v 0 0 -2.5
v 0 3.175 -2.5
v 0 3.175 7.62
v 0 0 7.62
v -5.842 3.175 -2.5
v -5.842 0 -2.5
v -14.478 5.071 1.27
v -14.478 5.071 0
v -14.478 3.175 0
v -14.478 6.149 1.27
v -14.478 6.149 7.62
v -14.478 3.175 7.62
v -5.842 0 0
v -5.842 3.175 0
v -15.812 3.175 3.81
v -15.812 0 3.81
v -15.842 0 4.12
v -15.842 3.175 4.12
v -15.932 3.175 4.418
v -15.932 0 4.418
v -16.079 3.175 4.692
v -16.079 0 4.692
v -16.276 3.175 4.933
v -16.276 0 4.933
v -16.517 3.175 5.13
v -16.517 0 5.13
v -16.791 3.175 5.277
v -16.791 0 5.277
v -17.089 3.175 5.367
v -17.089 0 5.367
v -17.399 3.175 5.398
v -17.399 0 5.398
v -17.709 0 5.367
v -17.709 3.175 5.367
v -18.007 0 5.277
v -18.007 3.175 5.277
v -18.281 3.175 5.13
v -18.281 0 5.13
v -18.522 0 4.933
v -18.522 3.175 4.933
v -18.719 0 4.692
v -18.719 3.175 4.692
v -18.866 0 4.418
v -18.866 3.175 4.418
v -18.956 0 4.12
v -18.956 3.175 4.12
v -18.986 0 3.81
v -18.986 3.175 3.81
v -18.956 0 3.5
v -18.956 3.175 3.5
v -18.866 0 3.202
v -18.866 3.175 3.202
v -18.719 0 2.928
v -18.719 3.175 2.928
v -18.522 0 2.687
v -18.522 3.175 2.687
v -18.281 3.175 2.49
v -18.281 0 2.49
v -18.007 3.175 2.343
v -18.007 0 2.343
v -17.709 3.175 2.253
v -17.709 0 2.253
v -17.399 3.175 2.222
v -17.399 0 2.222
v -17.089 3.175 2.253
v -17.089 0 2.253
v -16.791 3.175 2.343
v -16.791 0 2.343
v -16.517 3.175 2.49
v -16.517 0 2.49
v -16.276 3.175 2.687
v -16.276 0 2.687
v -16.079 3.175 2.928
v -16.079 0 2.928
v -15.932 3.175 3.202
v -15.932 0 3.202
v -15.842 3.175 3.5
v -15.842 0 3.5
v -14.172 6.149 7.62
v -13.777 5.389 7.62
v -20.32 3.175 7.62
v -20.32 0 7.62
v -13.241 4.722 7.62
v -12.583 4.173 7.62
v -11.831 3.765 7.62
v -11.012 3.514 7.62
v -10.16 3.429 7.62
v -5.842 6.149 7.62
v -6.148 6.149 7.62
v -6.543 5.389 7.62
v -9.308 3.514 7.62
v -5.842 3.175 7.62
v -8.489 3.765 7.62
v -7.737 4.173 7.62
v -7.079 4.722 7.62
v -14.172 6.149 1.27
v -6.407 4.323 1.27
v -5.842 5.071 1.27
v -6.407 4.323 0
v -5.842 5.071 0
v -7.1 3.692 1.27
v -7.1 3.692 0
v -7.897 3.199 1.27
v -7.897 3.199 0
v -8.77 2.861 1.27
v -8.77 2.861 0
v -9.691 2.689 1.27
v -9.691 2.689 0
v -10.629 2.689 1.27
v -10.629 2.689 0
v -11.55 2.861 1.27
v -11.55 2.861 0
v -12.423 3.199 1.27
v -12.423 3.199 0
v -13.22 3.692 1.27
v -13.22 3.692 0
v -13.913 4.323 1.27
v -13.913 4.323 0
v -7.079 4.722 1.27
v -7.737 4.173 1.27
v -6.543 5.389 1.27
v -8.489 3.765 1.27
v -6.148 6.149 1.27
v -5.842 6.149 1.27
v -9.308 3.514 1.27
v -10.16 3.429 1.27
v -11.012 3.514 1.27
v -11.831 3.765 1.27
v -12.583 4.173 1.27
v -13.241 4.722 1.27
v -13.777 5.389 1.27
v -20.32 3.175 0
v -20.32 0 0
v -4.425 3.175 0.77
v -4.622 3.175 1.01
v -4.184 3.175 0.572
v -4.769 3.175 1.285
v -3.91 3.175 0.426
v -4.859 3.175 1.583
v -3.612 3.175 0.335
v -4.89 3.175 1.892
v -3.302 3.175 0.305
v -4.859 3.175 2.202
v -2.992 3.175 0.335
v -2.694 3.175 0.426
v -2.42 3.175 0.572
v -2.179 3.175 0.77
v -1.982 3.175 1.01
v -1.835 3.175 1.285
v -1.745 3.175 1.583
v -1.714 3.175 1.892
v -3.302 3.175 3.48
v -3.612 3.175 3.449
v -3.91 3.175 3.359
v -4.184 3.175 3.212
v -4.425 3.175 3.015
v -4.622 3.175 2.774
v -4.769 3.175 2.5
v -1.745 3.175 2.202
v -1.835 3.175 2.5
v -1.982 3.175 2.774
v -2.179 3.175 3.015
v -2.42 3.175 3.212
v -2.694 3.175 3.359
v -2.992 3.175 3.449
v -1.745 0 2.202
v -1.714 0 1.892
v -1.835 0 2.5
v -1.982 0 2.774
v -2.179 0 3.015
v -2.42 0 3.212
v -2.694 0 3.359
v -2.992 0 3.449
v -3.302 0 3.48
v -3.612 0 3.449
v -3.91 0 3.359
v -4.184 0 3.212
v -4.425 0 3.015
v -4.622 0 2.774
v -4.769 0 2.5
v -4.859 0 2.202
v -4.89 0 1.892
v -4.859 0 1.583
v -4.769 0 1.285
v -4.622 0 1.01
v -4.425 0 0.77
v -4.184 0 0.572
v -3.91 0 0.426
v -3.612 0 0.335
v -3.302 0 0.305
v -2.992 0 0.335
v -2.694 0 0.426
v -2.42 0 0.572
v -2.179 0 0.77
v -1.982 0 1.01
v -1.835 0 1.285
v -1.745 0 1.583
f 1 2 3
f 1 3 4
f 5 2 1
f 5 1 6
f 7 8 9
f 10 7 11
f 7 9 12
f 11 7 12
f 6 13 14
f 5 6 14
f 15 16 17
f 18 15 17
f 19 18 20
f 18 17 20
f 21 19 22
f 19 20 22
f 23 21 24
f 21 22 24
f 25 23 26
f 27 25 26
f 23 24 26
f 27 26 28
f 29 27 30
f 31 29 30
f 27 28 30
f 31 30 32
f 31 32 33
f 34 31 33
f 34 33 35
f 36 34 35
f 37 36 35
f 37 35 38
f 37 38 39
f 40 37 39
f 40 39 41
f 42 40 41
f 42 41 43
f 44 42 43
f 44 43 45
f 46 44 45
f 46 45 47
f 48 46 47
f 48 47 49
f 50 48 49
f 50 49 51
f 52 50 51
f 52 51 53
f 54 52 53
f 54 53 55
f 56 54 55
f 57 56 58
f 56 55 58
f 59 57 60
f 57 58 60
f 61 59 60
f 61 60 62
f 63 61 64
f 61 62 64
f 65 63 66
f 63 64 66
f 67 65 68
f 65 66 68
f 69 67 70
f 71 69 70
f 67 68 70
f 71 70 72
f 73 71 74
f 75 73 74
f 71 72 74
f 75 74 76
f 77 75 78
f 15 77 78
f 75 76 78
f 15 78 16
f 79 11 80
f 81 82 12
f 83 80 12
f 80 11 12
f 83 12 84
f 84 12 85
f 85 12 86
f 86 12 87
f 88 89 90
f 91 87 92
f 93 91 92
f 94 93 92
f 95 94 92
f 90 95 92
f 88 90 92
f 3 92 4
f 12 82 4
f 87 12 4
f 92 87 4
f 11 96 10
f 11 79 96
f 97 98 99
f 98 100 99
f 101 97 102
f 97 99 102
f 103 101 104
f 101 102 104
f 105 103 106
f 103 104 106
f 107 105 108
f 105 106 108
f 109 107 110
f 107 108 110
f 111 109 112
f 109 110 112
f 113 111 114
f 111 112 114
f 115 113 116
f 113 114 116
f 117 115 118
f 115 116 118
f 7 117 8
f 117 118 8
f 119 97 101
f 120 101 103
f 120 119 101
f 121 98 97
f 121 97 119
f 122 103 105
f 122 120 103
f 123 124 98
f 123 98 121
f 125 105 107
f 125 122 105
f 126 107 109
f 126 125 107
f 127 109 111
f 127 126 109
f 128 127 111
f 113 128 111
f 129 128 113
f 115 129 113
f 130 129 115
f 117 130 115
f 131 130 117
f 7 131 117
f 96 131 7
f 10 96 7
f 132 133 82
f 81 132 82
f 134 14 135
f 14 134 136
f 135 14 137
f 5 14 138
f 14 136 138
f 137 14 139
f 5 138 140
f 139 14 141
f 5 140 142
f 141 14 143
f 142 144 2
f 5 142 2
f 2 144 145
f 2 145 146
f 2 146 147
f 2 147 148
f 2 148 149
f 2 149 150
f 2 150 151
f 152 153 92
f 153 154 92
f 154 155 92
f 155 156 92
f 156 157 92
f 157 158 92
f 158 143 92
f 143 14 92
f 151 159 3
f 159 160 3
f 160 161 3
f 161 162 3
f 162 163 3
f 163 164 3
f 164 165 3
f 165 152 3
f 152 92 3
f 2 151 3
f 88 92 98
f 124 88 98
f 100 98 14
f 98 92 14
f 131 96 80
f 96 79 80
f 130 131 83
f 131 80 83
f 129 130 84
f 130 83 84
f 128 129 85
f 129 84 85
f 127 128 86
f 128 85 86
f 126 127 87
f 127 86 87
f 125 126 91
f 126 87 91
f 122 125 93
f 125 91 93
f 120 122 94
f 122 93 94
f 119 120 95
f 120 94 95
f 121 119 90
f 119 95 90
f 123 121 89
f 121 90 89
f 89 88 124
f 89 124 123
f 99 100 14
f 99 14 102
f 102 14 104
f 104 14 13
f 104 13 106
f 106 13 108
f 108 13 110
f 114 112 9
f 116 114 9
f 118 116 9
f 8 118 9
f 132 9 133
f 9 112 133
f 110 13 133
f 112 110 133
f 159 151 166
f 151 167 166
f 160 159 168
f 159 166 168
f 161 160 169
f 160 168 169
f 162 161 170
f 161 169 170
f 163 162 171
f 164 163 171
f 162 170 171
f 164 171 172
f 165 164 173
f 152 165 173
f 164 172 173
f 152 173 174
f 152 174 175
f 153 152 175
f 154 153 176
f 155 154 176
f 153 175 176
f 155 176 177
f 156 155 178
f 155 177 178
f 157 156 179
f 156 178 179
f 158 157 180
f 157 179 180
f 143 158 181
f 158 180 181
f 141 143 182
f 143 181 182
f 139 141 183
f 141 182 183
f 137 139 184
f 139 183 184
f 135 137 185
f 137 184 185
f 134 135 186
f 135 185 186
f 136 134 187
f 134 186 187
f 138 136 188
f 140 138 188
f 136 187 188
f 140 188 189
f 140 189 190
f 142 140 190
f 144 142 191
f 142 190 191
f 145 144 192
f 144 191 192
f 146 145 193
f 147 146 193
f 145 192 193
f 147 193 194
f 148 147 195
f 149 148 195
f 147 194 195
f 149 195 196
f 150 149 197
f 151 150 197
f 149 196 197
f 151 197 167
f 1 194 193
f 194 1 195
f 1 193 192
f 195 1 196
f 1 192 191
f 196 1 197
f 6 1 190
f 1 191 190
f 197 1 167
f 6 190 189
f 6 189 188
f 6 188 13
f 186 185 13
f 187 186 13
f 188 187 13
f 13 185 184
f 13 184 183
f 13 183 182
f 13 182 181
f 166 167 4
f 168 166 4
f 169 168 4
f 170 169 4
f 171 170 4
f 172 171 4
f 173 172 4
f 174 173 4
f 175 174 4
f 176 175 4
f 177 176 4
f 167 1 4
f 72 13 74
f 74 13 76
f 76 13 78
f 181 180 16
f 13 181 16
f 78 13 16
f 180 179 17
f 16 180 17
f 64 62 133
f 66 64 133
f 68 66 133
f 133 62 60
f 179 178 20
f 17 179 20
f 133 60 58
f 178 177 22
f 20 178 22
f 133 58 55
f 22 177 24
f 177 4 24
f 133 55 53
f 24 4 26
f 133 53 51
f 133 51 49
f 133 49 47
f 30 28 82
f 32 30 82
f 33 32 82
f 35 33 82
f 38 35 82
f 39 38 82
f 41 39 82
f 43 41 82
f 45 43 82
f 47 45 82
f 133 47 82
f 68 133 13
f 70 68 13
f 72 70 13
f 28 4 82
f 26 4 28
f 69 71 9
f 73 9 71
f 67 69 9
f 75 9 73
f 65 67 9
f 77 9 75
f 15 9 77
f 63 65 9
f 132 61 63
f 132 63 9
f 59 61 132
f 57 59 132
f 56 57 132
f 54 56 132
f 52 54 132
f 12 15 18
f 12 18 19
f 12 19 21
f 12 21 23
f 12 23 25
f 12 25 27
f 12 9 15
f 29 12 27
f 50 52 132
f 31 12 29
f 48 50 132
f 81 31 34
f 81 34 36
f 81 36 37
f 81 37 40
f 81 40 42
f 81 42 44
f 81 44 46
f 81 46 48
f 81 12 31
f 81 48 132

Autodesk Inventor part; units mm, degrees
ref_plane "YZ Plane" through (0, 0, 0) normal (1, 0, 0) x (0, 1, 0)
ref_plane "XZ Plane" through (0, 0, 0) normal (0, 1, 0) x (-1, 0, 0)
ref_plane "XY Plane" through (0, 0, 0) normal (0, 0, 1) x (1, 0, 0)
sketch "Sketch1" plane through (0, 0, 0) normal (0, 1, 0) x (-1, 0, 0)
  line L0 (0, 0) -> (20.32, 0)
  line L1 (20.32, 0) -> (20.32, 7.62)
  line L2 (20.32, 7.62) -> (0, 7.62)
  line L3 (0, 7.62) -> (0, 0)
  dimension "d0" = 20.32
  dimension "d1" = 7.62
extrude "Extrusion1" add sketch "Sketch1" along normal blind 3.175
sketch "Sketch2" plane through (0, 3.175, 0) normal (0, 1, 0) x (1, 0, 0)
  line L0 (0, 0) -> (-20.32, 0) projected
  line L1 (-20.32, 0) -> (-20.32, -7.62) projected
  line L2 (-20.32, -7.62) -> (0, -7.62) projected
  line L3 (-14.478, -7.62) -> (-5.842, -7.62)
  line L4 (-5.842, -7.62) -> (-5.842, 0)
  line L5 (-5.842, 0) -> (-14.478, 0)
  line L6 (-14.478, 0) -> (-14.478, -7.62)
  dimension "d4" = 8.636
  dimension "d5" = 5.842
extrude "Extrusion2" add sketch "Sketch2" along normal blind 7.112 contours L4 L2 L6 L0
sketch "Sketch3" plane through (-20.32, 0, 7.62) normal (0, 0, 1) x (1, 0, 0)
  line L0 (14.478, 3.175) -> (14.478, 10.287) projected
  line L1 (5.842, 10.287) -> (14.478, 10.287) projected
  circle A0 centre (10.16, 7.747) radius 4.318
  line L2 (5.842, 10.287) -> (14.478, 10.287)
  line L3 (14.478, 10.287) -> (14.478, 7.747)
  line L4 (14.478, 7.747) -> (5.842, 7.747)
  line L5 (5.842, 7.747) -> (5.842, 10.287)
  line L6 (5.842, 7.747) -> (14.478, 7.747)
  line L7 (14.478, 7.747) -> (14.478, 6.1492)
  line L8 (14.478, 6.1492) -> (5.842, 6.1492)
  line L9 (5.842, 6.1492) -> (5.842, 7.747)
  dimension "d8" = 8.636
  dimension "d9" = 2.54
extrude "Extrusion3" cut sketch "Sketch3" against normal up to surface (7.62 mm away)
sketch "Sketch5" plane through (0, 0, 0) normal (0, 0, -1) x (-1, 0, 0)
  arc A0 (6.1485, 6.1492) -> (14.1715, 6.1492) centre (10.16, 7.747) ccw projected
  circle A1 centre (10.16, 7.747) radius 5.08
  dimension "d21" = 10.16
extrude "Extrusion5" cut sketch "Sketch5" against normal blind 1.27
sketch "Sketch4" plane through (0, 0, 0) normal (0, -1, 0) x (1, 0, 0)
  line L0 (-20.32, 7.62) -> (0, 7.62) projected
  line L1 (-20.32, 0) -> (-20.32, 7.62) projected
  circle A0 centre (-17.399, 3.81) radius 1.5875
  circle A1 centre (-3.302, 1.8923) radius 1.5875
  dimension "d12" = 3.175
  dimension "d14" = 3.81
  dimension "d15" = 2.921
  dimension "d16" = 3.175
  dimension "d26" = 14.097
  dimension "d27" = 1.9177
extrude "Extrusion4" cut sketch "Sketch4" against normal up to next
sketch "Sketch6" plane through (0, 0, 0) normal (0, 0, -1) x (-1, 0, 0)
  line L0 (5.842, 3.175) -> (0, 3.175)
  line L1 (0, 3.175) -> (0, 0)
  line L2 (0, 0) -> (5.842, 0)
  line L3 (5.842, 0) -> (5.842, 3.175)
extrude "Extrusion6" add sketch "Sketch6" along normal blind 2.5
properties part number "Gbase 3"
